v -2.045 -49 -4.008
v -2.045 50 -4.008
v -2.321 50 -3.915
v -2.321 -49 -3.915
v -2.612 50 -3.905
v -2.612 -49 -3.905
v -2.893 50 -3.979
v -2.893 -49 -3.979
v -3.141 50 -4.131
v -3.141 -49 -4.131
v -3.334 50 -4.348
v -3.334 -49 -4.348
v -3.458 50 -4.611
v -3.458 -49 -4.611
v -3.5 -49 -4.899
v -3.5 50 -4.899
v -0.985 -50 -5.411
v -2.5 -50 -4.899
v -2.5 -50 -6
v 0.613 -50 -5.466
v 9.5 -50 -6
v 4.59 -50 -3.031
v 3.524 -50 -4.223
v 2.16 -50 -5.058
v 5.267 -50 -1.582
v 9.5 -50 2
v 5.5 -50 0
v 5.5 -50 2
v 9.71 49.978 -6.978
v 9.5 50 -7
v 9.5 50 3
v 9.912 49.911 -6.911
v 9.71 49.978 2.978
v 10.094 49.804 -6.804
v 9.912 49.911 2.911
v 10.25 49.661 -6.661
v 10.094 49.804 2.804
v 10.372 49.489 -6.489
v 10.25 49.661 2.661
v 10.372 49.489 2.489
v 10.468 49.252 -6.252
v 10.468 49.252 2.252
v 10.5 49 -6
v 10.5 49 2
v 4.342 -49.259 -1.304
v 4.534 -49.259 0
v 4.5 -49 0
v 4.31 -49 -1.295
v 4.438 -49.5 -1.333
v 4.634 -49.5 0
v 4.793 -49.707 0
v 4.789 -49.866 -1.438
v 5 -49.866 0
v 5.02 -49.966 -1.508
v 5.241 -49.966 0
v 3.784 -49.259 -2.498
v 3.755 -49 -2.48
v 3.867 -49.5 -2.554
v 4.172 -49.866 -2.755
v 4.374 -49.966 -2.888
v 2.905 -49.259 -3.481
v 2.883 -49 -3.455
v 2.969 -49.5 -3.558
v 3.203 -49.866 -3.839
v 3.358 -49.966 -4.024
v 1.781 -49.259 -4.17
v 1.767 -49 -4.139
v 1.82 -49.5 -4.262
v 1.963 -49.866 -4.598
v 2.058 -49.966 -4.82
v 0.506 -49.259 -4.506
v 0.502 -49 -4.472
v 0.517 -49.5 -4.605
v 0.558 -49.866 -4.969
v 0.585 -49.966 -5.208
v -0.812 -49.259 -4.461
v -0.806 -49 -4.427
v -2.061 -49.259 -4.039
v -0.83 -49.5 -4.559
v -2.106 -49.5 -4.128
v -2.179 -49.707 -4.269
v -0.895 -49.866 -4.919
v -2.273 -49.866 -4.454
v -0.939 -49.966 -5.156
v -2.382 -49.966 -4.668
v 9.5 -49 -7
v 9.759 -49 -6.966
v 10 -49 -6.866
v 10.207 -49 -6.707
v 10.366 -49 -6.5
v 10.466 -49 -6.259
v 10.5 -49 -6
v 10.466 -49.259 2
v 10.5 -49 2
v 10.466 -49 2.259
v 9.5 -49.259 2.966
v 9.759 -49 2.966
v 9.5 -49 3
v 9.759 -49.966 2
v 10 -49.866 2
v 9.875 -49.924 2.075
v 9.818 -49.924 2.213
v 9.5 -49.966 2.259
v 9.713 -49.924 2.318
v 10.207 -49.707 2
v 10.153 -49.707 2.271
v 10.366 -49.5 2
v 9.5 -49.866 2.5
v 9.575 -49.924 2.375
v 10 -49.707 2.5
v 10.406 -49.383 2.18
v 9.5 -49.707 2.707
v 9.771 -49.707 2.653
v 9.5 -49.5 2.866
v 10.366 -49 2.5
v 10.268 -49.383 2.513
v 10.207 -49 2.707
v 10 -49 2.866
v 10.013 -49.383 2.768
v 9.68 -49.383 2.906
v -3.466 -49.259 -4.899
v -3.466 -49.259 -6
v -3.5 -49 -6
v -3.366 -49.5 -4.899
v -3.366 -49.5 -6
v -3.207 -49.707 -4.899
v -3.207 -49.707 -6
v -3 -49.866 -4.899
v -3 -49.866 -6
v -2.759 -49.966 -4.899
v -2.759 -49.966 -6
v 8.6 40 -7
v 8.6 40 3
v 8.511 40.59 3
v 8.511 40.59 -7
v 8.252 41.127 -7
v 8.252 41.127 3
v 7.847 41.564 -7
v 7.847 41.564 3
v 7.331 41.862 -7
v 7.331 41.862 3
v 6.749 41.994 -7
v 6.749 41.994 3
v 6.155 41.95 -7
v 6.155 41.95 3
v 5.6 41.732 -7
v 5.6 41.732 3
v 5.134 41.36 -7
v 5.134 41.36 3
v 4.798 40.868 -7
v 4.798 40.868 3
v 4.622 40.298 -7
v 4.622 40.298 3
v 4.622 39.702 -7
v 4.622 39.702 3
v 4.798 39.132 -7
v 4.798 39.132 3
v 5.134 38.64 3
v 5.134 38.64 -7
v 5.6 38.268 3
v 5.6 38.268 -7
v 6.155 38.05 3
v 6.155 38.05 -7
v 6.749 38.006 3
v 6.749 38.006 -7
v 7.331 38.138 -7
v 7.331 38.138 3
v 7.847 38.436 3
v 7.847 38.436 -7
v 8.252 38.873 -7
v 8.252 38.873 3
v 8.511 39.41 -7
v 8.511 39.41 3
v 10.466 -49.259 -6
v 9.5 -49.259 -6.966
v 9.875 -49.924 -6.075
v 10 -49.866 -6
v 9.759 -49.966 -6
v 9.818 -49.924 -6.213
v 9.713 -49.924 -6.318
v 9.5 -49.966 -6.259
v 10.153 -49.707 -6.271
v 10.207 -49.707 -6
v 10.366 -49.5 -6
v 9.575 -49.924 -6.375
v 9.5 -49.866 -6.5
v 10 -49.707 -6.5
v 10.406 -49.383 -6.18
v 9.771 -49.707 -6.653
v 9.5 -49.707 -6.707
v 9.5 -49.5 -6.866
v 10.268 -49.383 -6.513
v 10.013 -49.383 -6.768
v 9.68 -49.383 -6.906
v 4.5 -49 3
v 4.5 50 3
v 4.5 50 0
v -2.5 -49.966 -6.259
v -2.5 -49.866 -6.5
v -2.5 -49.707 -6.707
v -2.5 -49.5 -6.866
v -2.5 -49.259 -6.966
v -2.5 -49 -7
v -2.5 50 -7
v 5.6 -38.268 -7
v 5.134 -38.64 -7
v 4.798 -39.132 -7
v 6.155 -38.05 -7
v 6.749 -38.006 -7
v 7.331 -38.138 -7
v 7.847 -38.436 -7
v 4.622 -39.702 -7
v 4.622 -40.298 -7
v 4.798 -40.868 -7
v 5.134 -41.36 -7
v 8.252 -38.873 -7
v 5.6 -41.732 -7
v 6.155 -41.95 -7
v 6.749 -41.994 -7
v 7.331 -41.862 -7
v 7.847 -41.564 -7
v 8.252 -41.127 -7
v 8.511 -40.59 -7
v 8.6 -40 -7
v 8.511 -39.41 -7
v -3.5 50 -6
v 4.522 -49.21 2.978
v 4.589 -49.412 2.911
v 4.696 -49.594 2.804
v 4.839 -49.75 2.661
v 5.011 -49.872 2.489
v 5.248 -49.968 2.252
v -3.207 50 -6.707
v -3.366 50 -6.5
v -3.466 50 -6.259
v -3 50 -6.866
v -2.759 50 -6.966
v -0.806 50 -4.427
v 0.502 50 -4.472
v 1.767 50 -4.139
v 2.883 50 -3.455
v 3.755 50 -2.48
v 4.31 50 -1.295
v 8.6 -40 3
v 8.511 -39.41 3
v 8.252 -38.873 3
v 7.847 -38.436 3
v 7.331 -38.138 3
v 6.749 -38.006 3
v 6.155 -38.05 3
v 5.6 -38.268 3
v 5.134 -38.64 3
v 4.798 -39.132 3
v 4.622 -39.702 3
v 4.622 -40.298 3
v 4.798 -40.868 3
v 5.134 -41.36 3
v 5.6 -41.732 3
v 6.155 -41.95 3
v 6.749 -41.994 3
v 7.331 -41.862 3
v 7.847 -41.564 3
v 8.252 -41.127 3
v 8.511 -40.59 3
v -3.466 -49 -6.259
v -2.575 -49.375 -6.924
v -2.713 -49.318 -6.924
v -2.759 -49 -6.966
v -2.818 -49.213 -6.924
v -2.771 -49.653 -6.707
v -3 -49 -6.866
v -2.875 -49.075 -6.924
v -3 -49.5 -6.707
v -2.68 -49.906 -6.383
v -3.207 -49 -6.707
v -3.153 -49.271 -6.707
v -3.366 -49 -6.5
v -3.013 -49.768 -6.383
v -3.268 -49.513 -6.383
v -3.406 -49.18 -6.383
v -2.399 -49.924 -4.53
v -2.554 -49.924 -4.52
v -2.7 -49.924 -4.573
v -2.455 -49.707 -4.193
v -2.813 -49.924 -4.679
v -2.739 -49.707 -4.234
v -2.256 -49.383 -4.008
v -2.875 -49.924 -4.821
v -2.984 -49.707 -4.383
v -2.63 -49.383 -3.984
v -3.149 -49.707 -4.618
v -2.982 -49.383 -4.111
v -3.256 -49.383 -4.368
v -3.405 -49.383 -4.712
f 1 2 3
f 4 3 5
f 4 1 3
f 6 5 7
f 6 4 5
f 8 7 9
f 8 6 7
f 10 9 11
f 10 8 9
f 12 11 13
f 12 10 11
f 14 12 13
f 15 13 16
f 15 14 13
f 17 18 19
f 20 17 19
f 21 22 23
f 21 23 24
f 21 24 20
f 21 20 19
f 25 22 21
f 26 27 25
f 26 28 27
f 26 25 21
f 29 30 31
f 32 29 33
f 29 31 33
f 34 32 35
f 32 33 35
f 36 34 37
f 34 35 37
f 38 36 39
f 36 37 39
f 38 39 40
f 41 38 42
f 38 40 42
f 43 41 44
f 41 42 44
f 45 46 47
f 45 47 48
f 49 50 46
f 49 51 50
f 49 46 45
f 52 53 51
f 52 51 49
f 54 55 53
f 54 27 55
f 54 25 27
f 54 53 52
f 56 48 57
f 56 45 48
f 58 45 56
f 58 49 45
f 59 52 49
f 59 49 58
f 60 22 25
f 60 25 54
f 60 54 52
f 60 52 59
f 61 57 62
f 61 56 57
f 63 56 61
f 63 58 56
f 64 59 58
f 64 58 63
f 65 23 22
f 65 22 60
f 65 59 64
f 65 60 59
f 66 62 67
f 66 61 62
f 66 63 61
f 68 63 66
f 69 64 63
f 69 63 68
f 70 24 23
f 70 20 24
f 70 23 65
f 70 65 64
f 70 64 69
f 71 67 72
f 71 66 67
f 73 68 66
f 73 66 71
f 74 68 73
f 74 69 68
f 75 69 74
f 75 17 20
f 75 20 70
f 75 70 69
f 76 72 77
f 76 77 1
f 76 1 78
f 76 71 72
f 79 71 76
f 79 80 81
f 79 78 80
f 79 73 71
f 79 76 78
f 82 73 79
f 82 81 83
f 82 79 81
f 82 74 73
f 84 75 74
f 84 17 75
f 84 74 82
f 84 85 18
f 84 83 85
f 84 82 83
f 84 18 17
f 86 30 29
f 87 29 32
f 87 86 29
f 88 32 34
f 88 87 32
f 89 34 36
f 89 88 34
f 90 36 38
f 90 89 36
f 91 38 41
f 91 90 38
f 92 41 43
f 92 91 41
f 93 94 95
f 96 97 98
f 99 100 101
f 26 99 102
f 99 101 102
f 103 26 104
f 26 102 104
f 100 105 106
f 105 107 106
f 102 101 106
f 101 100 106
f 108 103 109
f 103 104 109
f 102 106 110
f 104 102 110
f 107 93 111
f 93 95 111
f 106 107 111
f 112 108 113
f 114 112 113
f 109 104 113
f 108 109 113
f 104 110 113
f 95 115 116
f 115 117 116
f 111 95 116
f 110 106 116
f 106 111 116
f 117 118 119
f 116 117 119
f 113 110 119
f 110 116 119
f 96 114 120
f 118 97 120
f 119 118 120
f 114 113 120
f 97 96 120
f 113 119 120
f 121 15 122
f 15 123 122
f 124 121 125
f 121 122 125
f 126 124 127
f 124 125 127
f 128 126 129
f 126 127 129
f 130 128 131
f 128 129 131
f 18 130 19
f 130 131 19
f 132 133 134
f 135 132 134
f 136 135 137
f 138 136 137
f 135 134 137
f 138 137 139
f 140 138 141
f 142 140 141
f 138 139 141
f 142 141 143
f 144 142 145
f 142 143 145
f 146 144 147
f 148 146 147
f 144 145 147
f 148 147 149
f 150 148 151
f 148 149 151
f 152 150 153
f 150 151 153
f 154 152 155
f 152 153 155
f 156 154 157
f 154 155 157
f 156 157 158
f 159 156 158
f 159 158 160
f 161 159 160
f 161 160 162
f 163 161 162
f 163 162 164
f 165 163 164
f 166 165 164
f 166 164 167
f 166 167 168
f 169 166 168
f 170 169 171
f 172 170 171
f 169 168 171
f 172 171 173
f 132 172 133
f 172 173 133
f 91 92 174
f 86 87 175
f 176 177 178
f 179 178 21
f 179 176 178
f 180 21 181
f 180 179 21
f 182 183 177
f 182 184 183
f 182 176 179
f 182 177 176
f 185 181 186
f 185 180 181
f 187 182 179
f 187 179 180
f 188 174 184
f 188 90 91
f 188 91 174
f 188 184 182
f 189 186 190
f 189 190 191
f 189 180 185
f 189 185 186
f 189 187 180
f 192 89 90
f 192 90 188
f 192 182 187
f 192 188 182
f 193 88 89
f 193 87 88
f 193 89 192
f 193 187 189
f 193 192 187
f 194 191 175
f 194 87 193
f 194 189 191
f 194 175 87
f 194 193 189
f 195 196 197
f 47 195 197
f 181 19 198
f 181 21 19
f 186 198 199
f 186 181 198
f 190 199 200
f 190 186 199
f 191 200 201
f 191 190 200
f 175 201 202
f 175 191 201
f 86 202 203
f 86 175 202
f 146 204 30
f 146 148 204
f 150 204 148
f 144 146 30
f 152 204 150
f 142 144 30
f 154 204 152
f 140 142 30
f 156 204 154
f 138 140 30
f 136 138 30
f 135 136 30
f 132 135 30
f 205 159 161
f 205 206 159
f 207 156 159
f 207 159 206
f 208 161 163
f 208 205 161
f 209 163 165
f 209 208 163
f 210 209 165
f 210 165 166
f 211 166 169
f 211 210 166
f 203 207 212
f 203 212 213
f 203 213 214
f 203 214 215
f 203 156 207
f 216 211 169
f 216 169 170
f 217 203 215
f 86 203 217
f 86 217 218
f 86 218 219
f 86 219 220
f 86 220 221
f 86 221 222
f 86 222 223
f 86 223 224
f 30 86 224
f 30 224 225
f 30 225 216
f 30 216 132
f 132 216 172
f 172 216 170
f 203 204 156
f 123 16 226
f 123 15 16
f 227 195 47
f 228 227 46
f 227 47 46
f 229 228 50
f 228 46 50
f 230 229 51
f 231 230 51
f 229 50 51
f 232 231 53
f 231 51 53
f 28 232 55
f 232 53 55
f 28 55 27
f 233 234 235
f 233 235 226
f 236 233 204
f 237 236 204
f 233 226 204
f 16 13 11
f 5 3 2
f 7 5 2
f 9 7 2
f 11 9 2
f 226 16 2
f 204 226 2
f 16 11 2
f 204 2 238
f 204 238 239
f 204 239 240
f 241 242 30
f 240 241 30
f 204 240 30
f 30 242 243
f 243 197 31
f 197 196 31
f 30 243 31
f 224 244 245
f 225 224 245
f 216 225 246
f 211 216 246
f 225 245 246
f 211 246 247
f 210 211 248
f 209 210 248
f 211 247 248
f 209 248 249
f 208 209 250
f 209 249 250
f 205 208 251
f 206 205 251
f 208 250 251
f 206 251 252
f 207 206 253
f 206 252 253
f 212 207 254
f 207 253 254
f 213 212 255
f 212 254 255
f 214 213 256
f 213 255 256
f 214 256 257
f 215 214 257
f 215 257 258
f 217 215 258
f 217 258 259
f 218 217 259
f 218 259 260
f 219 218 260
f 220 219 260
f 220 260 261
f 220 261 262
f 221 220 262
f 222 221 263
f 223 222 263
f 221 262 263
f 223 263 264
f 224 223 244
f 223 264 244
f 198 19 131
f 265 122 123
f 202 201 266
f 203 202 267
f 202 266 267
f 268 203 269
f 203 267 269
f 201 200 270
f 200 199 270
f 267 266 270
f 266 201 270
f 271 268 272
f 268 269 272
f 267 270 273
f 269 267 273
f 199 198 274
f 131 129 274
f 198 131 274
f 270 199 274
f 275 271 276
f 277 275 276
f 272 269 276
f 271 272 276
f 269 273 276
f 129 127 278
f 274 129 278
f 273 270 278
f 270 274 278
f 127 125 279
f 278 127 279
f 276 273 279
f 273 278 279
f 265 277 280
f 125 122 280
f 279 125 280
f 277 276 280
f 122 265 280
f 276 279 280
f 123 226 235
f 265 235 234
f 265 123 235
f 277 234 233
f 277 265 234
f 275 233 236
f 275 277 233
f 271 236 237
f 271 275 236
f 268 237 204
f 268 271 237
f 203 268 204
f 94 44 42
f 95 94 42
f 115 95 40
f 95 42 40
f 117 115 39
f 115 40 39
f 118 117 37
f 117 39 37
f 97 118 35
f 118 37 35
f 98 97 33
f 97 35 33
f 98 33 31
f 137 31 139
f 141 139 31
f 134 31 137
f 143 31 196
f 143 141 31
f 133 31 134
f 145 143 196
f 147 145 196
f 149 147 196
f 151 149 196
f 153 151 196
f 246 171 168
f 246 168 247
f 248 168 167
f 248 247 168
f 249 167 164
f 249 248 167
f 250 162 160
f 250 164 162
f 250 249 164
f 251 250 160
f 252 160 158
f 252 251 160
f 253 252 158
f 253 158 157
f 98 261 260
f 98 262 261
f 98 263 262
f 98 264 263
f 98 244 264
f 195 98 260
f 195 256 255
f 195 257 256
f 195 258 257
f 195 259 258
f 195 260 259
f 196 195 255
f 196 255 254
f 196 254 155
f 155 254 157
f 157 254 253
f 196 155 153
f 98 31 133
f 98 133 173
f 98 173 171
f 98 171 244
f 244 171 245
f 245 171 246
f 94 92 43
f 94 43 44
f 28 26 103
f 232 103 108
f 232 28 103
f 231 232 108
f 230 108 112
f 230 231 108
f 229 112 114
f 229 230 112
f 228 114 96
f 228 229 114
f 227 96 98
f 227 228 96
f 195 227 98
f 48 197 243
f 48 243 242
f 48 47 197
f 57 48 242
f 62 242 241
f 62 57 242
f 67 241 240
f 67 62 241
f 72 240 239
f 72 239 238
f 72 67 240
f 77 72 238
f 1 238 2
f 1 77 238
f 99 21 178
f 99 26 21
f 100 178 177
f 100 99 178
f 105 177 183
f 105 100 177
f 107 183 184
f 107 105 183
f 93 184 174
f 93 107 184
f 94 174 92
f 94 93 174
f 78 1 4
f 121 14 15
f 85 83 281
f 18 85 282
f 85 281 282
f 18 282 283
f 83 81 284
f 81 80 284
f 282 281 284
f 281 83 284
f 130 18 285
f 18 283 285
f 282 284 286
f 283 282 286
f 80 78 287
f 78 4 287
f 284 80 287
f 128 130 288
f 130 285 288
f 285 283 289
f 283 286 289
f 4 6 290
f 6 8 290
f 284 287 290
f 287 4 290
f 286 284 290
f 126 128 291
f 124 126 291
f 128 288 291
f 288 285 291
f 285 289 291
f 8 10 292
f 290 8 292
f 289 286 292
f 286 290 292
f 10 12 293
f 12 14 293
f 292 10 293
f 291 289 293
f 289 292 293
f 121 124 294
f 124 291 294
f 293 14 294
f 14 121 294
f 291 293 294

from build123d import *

# Parameters (mm, degrees)
F1_DEPTH = 50
F2_R     = 2
F3_DEPTH = 10
F4_R     = 1


with BuildPart() as f1:
    # F0 (on Front) → F1 (new body, symmetric)
    with BuildSketch(Plane.XZ):
        with BuildLine():
            ThreePointArc((4.5, 0), (1.5, -4.242641), (-3.5, -2.828427))
            Line((-3.5, -2.828427), (-3.5, -7))
            Line((-3.5, -7), (10.5, -7))
            Line((10.5, -7), (10.5, 3))
            Line((10.5, 3), (4.5, 3))
            Line((4.5, 3), (4.5, 0))
        make_face()
    extrude(amount=F1_DEPTH, both=True)

    # F2 (on face) → F3 (cut, through all)
    with BuildSketch(Plane.XY.offset(3)):
        with Locations((6.6, -40)):
            Circle(F2_R)
        with Locations((6.6, 40)):
            Circle(F2_R)
    extrude(amount=-F3_DEPTH, mode=Mode.SUBTRACT)

    # F4
    f4_edges = [f1.edges().sort_by_distance(p)[0] for p in [
        (10.5, 0, -7),
        (10.5, 50, -2),
        (10.5, 0, 3),
        (10.5, -50, -2),
        (1.5, -50, -4.242641),
        (-3.5, -50, -4.914214),
        (3.5, -50, -7),
        (7.5, -50, 3),
        (4.5, -50, 1.5),
        (-3.5, 0, -2.828427),
        (-3.5, 0, -7),
    ]]
    fillet(f4_edges, radius=F4_R)


solid = f1.part
